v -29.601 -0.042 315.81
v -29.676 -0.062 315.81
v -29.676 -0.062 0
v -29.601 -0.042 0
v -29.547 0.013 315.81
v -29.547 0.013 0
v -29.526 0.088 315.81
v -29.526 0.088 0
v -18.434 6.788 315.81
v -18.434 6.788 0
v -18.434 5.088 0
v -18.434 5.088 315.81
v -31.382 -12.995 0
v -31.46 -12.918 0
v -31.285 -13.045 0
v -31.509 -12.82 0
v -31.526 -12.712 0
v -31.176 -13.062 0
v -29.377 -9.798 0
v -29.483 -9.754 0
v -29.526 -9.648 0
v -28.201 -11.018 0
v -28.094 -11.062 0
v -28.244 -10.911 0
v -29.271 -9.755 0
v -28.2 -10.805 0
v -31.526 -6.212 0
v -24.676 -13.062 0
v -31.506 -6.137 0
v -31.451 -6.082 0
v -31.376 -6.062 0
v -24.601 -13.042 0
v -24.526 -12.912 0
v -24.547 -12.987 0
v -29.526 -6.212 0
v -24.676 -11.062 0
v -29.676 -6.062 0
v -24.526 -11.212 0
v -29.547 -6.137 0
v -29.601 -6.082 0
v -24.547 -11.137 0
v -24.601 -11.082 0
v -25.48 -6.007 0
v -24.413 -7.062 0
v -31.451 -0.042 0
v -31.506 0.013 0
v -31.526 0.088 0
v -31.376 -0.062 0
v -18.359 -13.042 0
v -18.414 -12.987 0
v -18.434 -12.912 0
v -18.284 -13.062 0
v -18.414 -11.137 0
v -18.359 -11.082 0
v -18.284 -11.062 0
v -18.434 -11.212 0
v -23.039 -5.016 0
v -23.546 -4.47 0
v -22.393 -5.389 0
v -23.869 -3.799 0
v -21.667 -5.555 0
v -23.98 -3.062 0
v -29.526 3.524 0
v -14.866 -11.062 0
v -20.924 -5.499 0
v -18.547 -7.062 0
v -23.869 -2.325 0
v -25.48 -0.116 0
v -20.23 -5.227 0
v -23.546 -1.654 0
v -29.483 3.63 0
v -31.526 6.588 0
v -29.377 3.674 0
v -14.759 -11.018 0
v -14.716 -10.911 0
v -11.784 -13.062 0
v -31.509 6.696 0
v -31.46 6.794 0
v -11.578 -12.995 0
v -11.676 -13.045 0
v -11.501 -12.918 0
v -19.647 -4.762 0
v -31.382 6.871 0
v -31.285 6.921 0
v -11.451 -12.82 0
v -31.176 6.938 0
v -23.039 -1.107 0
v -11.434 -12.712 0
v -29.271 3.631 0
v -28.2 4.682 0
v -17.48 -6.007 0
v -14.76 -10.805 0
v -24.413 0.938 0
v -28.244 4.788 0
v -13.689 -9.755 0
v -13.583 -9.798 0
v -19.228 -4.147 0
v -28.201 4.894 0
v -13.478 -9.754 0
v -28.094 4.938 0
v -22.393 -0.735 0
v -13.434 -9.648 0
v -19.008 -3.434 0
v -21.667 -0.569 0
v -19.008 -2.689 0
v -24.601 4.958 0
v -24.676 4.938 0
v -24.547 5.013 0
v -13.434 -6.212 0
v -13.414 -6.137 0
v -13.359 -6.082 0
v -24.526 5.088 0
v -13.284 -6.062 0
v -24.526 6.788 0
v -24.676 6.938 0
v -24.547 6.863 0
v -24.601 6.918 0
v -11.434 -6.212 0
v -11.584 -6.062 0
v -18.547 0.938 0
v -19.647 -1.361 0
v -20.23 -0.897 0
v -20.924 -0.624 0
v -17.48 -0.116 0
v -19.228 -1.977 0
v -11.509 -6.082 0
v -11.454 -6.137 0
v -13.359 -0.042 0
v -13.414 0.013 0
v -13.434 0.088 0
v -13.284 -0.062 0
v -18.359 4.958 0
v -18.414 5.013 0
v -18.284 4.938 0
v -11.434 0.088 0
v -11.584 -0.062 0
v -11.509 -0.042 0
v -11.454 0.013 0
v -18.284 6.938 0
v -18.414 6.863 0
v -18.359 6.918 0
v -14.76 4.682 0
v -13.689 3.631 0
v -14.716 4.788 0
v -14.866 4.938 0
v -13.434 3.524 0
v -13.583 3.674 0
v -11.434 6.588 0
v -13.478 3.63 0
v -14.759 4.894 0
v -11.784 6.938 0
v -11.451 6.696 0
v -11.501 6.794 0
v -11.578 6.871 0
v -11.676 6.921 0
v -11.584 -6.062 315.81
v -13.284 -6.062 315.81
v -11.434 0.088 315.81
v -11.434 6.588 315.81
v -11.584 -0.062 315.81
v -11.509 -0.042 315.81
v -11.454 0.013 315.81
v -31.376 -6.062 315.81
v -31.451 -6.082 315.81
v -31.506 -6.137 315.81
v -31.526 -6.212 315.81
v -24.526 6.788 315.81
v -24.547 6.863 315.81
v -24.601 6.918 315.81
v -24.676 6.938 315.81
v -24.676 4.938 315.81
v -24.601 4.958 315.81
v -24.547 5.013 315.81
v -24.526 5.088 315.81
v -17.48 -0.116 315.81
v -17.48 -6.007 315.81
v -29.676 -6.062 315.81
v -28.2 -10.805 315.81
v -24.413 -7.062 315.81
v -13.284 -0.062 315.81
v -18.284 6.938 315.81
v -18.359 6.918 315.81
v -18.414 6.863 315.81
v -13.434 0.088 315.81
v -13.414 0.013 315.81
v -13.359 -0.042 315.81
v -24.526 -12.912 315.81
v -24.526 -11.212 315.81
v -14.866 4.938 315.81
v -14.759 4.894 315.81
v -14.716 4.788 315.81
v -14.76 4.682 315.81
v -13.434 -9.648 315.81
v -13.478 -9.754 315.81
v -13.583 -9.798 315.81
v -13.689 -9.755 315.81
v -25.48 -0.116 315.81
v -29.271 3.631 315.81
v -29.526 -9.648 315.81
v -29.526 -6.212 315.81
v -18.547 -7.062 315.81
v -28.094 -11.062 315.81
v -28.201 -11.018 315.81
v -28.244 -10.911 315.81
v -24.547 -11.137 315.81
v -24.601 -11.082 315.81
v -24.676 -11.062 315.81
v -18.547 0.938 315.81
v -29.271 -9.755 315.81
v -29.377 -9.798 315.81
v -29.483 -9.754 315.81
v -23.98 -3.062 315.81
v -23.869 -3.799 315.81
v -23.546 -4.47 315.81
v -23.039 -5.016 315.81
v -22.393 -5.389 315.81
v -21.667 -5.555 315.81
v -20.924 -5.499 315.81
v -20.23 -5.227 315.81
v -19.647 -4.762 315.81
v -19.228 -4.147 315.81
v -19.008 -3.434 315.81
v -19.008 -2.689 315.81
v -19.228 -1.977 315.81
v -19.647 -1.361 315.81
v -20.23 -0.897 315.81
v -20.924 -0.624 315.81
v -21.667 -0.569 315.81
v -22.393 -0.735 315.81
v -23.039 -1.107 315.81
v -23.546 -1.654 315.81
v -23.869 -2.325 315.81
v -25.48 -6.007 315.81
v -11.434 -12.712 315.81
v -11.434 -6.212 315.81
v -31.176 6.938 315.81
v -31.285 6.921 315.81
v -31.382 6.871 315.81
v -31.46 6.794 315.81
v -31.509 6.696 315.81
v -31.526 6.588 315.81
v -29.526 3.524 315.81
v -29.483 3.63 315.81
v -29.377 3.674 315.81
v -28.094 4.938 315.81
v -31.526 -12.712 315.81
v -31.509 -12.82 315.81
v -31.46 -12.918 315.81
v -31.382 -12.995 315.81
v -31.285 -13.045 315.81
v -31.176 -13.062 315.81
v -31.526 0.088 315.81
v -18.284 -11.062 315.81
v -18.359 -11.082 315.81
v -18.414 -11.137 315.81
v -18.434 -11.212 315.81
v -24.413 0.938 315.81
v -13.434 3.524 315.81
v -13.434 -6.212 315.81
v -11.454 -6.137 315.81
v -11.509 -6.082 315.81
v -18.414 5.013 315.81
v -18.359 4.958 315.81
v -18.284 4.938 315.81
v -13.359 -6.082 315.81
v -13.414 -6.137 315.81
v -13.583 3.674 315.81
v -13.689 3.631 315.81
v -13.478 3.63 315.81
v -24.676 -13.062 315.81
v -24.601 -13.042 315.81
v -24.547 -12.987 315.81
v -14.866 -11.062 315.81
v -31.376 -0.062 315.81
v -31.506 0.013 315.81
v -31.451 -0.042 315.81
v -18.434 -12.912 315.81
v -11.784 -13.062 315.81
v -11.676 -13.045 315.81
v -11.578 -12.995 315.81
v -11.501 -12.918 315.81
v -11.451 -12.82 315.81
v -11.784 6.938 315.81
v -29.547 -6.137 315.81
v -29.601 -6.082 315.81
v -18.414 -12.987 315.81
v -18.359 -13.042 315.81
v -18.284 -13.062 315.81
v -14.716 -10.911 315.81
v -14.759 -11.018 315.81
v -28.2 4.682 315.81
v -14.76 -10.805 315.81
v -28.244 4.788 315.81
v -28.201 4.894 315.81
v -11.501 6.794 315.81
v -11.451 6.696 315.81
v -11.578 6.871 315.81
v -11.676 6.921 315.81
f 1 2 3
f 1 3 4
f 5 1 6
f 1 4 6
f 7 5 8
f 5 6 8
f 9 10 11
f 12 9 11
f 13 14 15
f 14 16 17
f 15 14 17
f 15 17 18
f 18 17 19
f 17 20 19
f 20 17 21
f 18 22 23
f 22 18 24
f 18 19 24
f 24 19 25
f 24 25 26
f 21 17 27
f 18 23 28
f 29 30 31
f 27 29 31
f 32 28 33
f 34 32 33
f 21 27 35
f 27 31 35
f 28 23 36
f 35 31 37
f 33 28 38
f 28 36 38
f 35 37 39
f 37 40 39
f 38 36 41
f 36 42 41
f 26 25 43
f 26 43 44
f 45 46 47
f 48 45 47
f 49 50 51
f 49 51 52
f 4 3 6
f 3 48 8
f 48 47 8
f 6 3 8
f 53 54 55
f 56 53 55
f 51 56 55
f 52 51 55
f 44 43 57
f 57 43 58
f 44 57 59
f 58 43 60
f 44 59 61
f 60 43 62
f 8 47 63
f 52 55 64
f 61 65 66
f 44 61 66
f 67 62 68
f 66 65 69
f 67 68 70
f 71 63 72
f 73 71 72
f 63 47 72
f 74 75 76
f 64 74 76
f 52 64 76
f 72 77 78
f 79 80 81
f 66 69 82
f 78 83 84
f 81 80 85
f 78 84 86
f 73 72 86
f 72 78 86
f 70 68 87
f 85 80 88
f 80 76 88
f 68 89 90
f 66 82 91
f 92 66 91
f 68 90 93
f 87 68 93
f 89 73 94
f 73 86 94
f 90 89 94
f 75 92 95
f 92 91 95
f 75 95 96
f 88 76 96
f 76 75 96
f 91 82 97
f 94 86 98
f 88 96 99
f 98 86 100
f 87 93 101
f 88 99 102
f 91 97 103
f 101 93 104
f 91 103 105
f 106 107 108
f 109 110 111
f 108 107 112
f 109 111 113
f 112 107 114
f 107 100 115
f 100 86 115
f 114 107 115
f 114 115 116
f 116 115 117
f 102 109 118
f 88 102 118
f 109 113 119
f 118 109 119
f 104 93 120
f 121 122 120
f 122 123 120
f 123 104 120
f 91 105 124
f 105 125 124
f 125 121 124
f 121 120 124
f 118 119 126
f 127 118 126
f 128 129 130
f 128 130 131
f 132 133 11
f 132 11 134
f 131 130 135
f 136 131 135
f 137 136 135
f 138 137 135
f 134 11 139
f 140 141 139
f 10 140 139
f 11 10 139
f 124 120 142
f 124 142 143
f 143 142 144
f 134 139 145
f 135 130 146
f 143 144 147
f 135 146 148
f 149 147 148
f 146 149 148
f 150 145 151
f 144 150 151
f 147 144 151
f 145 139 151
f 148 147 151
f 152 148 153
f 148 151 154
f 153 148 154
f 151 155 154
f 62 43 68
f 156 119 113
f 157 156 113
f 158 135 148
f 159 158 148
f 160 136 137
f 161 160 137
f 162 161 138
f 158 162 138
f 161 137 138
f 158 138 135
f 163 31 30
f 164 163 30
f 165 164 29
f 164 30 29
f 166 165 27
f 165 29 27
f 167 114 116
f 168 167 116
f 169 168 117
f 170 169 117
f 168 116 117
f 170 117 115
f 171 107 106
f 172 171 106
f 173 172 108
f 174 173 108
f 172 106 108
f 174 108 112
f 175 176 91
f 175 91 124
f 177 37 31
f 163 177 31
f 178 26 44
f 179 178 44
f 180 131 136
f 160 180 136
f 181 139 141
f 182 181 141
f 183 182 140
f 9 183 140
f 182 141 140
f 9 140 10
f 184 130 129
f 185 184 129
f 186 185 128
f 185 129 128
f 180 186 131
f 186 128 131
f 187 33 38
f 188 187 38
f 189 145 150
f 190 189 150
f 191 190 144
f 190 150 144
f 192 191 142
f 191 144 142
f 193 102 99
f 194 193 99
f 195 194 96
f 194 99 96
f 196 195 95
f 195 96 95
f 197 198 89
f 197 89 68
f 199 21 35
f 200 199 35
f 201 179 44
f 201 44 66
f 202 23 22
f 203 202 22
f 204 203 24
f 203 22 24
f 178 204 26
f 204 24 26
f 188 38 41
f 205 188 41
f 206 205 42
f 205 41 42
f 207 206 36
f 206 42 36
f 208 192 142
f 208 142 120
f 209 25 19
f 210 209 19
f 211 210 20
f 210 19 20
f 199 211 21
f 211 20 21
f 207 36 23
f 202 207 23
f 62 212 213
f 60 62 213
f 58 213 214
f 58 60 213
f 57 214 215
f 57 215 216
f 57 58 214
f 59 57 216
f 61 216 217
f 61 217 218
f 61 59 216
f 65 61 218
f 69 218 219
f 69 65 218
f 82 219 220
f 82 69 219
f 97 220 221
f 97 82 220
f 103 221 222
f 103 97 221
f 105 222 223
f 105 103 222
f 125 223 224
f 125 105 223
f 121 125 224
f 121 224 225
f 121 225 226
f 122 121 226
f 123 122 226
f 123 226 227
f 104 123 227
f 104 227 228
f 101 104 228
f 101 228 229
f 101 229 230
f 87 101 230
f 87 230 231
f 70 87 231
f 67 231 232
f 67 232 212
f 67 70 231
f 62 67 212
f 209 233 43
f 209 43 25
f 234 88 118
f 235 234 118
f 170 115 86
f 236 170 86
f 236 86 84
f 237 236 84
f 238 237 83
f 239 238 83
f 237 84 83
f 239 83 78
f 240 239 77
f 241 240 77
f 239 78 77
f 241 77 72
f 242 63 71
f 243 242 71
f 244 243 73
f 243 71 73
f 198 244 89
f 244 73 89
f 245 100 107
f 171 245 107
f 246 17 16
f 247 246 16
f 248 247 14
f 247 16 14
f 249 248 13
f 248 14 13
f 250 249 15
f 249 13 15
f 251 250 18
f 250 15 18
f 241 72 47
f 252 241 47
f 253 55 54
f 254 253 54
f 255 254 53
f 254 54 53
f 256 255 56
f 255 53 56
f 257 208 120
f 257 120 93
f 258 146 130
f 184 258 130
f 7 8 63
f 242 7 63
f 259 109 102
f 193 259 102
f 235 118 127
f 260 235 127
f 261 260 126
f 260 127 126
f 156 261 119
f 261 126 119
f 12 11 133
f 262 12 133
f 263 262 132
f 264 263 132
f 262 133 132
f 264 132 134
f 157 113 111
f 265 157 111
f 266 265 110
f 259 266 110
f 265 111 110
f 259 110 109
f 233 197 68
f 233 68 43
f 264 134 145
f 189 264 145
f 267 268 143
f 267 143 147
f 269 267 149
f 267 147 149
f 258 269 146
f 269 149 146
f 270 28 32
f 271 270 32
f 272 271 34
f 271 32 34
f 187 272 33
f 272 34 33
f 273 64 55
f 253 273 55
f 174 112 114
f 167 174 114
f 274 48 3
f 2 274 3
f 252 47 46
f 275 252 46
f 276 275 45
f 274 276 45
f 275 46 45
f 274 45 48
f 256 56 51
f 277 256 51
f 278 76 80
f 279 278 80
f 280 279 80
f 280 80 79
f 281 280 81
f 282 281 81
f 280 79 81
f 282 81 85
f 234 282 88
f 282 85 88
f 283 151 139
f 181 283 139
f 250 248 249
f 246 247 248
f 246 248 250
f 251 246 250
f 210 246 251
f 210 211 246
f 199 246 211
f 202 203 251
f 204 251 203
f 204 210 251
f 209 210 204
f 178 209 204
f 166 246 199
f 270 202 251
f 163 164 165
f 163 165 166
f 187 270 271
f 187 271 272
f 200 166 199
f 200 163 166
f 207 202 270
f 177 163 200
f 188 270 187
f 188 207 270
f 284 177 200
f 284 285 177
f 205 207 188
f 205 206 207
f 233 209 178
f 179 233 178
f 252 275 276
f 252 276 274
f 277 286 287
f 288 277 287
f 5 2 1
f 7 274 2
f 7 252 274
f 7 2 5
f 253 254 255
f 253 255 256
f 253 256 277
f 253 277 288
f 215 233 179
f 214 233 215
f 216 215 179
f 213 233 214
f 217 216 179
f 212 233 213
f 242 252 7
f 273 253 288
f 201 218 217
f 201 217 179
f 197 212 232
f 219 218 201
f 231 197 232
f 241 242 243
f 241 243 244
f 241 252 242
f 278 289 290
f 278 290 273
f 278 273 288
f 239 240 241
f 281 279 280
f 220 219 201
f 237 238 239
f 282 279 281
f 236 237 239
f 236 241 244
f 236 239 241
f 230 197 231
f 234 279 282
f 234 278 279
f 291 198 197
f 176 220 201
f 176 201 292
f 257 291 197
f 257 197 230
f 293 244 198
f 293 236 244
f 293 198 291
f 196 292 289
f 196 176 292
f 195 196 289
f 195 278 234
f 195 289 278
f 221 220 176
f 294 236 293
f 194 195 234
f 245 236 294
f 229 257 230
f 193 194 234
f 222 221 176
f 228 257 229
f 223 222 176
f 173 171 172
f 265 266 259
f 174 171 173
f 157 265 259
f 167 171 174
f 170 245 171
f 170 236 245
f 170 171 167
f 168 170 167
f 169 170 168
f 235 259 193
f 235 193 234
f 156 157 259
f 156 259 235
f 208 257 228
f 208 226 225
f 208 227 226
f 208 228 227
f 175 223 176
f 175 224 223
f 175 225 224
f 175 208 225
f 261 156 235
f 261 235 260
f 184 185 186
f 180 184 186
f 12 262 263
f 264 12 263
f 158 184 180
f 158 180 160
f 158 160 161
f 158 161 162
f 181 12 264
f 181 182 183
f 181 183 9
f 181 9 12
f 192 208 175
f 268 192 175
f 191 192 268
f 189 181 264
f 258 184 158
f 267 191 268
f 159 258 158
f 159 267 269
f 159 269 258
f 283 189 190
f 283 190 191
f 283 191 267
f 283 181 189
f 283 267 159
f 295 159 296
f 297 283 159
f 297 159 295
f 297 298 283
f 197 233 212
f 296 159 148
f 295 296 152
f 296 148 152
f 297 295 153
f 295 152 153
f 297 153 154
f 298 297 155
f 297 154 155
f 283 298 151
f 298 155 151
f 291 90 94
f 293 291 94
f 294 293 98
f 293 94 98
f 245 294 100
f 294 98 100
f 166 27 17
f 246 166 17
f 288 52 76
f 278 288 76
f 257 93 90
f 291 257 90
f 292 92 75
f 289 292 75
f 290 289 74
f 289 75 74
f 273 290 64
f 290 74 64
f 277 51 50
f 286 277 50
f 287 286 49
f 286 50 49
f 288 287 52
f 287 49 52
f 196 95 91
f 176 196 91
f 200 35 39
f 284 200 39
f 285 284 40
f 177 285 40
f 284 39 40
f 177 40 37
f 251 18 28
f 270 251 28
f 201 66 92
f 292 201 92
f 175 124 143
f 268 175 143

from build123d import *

# Parameters (mm, degrees)
SKETCH1_R           = 2.5
BOSS_EXTRUDE1_DEPTH = 315.81


with BuildPart() as part:
    # Sketch1 → Boss-Extrude1 (new body)
    with BuildSketch(Plane.XY):
        with BuildLine():
            Line((-31.376404226, -0.06181021), (-29.676404226, -0.06181021))
            ThreePointArc((-29.676404226, -0.06181021), (-29.570338208, -0.017876227), (-29.526404226, 0.08818979))
            Line((-29.526404226, 0.08818979), (-29.526404226, 3.524374304))
            ThreePointArc((-29.526404226, 3.524374304), (-29.43420518, 3.662790523), (-29.27095023, 3.631048831))
            Line((-29.27095023, 3.631048831), (-25.480107929, -0.116419988))
            Line((-25.480107929, -0.116419988), (-25.480107929, -6.007200432))
            Line((-25.480107929, -6.007200432), (-29.27095023, -9.754669251))
            ThreePointArc((-29.27095023, -9.754669251), (-29.43420518, -9.786410942), (-29.526404226, -9.647994723))
            Line((-29.526404226, -9.647994723), (-29.526404226, -6.21181021))
            ThreePointArc((-29.526404226, -6.21181021), (-29.570338208, -6.105744193), (-29.676404226, -6.06181021))
            Line((-29.676404226, -6.06181021), (-31.376404226, -6.06181021))
            ThreePointArc((-31.376404226, -6.06181021), (-31.482470243, -6.105744193), (-31.526404226, -6.21181021))
            Line((-31.526404226, -6.21181021), (-31.526404226, -12.71181021))
            ThreePointArc((-31.526404226, -12.71181021), (-31.423891599, -12.959297583), (-31.176404226, -13.06181021))
            Line((-31.176404226, -13.06181021), (-24.676404226, -13.06181021))
            ThreePointArc((-24.676404226, -13.06181021), (-24.570338208, -13.017876227), (-24.526404226, -12.91181021))
            Line((-24.526404226, -12.91181021), (-24.526404226, -11.21181021))
            ThreePointArc((-24.526404226, -11.21181021), (-24.570338208, -11.105744193), (-24.676404226, -11.06181021))
            Line((-24.676404226, -11.06181021), (-28.094489023, -11.06181021))
            ThreePointArc((-28.094489023, -11.06181021), (-28.233235517, -10.96881381), (-28.199943018, -10.805135682))
            Line((-28.199943018, -10.805135682), (-24.41329202, -7.06181021))
            Line((-24.41329202, -7.06181021), (-18.546923839, -7.06181021))
            Line((-18.546923839, -7.06181021), (-14.760272841, -10.805135682))
            ThreePointArc((-14.760272841, -10.805135682), (-14.726980342, -10.96881381), (-14.865726836, -11.06181021))
            Line((-14.865726836, -11.06181021), (-18.283811633, -11.06181021))
            ThreePointArc((-18.283811633, -11.06181021), (-18.38987765, -11.105744193), (-18.433811633, -11.21181021))
            Line((-18.433811633, -11.21181021), (-18.433811633, -12.91181021))
            ThreePointArc((-18.433811633, -12.91181021), (-18.38987765, -13.017876227), (-18.283811633, -13.06181021))
            Line((-18.283811633, -13.06181021), (-11.783811633, -13.06181021))
            ThreePointArc((-11.783811633, -13.06181021), (-11.53632426, -12.959297583), (-11.433811633, -12.71181021))
            Line((-11.433811633, -12.71181021), (-11.433811633, -6.21181021))
            ThreePointArc((-11.433811633, -6.21181021), (-11.477745616, -6.105744193), (-11.583811633, -6.06181021))
            Line((-11.583811633, -6.06181021), (-13.283811633, -6.06181021))
            ThreePointArc((-13.283811633, -6.06181021), (-13.38987765, -6.105744193), (-13.433811633, -6.21181021))
            Line((-13.433811633, -6.21181021), (-13.433811633, -9.647994723))
            ThreePointArc((-13.433811633, -9.647994723), (-13.526010678, -9.786410942), (-13.689265628, -9.754669251))
            Line((-13.689265628, -9.754669251), (-17.480107929, -6.007200432))
            Line((-17.480107929, -6.007200432), (-17.480107929, -0.116419988))
            Line((-17.480107929, -0.116419988), (-13.689265628, 3.631048831))
            ThreePointArc((-13.689265628, 3.631048831), (-13.526010678, 3.662790523), (-13.433811633, 3.524374304))
            Line((-13.433811633, 3.524374304), (-13.433811633, 0.08818979))
            ThreePointArc((-13.433811633, 0.08818979), (-13.38987765, -0.017876227), (-13.283811633, -0.06181021))
            Line((-13.283811633, -0.06181021), (-11.583811633, -0.06181021))
            ThreePointArc((-11.583811633, -0.06181021), (-11.477745616, -0.017876227), (-11.433811633, 0.08818979))
            Line((-11.433811633, 0.08818979), (-11.433811633, 6.58818979))
            ThreePointArc((-11.433811633, 6.58818979), (-11.53632426, 6.835677164), (-11.783811633, 6.93818979))
            Line((-11.783811633, 6.93818979), (-18.283811633, 6.93818979))
            ThreePointArc((-18.283811633, 6.93818979), (-18.38987765, 6.894255807), (-18.433811633, 6.78818979))
            Line((-18.433811633, 6.78818979), (-18.433811633, 5.08818979))
            ThreePointArc((-18.433811633, 5.08818979), (-18.38987765, 4.982123773), (-18.283811633, 4.93818979))
            Line((-18.283811633, 4.93818979), (-14.865726836, 4.93818979))
            ThreePointArc((-14.865726836, 4.93818979), (-14.726980342, 4.84519339), (-14.760272841, 4.681515262))
            Line((-14.760272841, 4.681515262), (-18.546923839, 0.93818979))
            Line((-18.546923839, 0.93818979), (-24.41329202, 0.93818979))
            Line((-24.41329202, 0.93818979), (-28.199943018, 4.681515262))
            ThreePointArc((-28.199943018, 4.681515262), (-28.233235517, 4.84519339), (-28.094489023, 4.93818979))
            Line((-28.094489023, 4.93818979), (-24.676404226, 4.93818979))
            ThreePointArc((-24.676404226, 4.93818979), (-24.570338208, 4.982123773), (-24.526404226, 5.08818979))
            Line((-24.526404226, 5.08818979), (-24.526404226, 6.78818979))
            ThreePointArc((-24.526404226, 6.78818979), (-24.570338208, 6.894255807), (-24.676404226, 6.93818979))
            Line((-24.676404226, 6.93818979), (-31.176404226, 6.93818979))
            ThreePointArc((-31.176404226, 6.93818979), (-31.423891599, 6.835677164), (-31.526404226, 6.58818979))
            Line((-31.526404226, 6.58818979), (-31.526404226, 0.08818979))
            ThreePointArc((-31.526404226, 0.08818979), (-31.482470243, -0.017876227), (-31.376404226, -0.06181021))
        make_face()
        with Locations(Location((-21.480107929, -3.06181021, 0), (0, 0, 180))):
            Circle(SKETCH1_R, mode=Mode.SUBTRACT)
    extrude(amount=BOSS_EXTRUDE1_DEPTH)


solid = part.part
